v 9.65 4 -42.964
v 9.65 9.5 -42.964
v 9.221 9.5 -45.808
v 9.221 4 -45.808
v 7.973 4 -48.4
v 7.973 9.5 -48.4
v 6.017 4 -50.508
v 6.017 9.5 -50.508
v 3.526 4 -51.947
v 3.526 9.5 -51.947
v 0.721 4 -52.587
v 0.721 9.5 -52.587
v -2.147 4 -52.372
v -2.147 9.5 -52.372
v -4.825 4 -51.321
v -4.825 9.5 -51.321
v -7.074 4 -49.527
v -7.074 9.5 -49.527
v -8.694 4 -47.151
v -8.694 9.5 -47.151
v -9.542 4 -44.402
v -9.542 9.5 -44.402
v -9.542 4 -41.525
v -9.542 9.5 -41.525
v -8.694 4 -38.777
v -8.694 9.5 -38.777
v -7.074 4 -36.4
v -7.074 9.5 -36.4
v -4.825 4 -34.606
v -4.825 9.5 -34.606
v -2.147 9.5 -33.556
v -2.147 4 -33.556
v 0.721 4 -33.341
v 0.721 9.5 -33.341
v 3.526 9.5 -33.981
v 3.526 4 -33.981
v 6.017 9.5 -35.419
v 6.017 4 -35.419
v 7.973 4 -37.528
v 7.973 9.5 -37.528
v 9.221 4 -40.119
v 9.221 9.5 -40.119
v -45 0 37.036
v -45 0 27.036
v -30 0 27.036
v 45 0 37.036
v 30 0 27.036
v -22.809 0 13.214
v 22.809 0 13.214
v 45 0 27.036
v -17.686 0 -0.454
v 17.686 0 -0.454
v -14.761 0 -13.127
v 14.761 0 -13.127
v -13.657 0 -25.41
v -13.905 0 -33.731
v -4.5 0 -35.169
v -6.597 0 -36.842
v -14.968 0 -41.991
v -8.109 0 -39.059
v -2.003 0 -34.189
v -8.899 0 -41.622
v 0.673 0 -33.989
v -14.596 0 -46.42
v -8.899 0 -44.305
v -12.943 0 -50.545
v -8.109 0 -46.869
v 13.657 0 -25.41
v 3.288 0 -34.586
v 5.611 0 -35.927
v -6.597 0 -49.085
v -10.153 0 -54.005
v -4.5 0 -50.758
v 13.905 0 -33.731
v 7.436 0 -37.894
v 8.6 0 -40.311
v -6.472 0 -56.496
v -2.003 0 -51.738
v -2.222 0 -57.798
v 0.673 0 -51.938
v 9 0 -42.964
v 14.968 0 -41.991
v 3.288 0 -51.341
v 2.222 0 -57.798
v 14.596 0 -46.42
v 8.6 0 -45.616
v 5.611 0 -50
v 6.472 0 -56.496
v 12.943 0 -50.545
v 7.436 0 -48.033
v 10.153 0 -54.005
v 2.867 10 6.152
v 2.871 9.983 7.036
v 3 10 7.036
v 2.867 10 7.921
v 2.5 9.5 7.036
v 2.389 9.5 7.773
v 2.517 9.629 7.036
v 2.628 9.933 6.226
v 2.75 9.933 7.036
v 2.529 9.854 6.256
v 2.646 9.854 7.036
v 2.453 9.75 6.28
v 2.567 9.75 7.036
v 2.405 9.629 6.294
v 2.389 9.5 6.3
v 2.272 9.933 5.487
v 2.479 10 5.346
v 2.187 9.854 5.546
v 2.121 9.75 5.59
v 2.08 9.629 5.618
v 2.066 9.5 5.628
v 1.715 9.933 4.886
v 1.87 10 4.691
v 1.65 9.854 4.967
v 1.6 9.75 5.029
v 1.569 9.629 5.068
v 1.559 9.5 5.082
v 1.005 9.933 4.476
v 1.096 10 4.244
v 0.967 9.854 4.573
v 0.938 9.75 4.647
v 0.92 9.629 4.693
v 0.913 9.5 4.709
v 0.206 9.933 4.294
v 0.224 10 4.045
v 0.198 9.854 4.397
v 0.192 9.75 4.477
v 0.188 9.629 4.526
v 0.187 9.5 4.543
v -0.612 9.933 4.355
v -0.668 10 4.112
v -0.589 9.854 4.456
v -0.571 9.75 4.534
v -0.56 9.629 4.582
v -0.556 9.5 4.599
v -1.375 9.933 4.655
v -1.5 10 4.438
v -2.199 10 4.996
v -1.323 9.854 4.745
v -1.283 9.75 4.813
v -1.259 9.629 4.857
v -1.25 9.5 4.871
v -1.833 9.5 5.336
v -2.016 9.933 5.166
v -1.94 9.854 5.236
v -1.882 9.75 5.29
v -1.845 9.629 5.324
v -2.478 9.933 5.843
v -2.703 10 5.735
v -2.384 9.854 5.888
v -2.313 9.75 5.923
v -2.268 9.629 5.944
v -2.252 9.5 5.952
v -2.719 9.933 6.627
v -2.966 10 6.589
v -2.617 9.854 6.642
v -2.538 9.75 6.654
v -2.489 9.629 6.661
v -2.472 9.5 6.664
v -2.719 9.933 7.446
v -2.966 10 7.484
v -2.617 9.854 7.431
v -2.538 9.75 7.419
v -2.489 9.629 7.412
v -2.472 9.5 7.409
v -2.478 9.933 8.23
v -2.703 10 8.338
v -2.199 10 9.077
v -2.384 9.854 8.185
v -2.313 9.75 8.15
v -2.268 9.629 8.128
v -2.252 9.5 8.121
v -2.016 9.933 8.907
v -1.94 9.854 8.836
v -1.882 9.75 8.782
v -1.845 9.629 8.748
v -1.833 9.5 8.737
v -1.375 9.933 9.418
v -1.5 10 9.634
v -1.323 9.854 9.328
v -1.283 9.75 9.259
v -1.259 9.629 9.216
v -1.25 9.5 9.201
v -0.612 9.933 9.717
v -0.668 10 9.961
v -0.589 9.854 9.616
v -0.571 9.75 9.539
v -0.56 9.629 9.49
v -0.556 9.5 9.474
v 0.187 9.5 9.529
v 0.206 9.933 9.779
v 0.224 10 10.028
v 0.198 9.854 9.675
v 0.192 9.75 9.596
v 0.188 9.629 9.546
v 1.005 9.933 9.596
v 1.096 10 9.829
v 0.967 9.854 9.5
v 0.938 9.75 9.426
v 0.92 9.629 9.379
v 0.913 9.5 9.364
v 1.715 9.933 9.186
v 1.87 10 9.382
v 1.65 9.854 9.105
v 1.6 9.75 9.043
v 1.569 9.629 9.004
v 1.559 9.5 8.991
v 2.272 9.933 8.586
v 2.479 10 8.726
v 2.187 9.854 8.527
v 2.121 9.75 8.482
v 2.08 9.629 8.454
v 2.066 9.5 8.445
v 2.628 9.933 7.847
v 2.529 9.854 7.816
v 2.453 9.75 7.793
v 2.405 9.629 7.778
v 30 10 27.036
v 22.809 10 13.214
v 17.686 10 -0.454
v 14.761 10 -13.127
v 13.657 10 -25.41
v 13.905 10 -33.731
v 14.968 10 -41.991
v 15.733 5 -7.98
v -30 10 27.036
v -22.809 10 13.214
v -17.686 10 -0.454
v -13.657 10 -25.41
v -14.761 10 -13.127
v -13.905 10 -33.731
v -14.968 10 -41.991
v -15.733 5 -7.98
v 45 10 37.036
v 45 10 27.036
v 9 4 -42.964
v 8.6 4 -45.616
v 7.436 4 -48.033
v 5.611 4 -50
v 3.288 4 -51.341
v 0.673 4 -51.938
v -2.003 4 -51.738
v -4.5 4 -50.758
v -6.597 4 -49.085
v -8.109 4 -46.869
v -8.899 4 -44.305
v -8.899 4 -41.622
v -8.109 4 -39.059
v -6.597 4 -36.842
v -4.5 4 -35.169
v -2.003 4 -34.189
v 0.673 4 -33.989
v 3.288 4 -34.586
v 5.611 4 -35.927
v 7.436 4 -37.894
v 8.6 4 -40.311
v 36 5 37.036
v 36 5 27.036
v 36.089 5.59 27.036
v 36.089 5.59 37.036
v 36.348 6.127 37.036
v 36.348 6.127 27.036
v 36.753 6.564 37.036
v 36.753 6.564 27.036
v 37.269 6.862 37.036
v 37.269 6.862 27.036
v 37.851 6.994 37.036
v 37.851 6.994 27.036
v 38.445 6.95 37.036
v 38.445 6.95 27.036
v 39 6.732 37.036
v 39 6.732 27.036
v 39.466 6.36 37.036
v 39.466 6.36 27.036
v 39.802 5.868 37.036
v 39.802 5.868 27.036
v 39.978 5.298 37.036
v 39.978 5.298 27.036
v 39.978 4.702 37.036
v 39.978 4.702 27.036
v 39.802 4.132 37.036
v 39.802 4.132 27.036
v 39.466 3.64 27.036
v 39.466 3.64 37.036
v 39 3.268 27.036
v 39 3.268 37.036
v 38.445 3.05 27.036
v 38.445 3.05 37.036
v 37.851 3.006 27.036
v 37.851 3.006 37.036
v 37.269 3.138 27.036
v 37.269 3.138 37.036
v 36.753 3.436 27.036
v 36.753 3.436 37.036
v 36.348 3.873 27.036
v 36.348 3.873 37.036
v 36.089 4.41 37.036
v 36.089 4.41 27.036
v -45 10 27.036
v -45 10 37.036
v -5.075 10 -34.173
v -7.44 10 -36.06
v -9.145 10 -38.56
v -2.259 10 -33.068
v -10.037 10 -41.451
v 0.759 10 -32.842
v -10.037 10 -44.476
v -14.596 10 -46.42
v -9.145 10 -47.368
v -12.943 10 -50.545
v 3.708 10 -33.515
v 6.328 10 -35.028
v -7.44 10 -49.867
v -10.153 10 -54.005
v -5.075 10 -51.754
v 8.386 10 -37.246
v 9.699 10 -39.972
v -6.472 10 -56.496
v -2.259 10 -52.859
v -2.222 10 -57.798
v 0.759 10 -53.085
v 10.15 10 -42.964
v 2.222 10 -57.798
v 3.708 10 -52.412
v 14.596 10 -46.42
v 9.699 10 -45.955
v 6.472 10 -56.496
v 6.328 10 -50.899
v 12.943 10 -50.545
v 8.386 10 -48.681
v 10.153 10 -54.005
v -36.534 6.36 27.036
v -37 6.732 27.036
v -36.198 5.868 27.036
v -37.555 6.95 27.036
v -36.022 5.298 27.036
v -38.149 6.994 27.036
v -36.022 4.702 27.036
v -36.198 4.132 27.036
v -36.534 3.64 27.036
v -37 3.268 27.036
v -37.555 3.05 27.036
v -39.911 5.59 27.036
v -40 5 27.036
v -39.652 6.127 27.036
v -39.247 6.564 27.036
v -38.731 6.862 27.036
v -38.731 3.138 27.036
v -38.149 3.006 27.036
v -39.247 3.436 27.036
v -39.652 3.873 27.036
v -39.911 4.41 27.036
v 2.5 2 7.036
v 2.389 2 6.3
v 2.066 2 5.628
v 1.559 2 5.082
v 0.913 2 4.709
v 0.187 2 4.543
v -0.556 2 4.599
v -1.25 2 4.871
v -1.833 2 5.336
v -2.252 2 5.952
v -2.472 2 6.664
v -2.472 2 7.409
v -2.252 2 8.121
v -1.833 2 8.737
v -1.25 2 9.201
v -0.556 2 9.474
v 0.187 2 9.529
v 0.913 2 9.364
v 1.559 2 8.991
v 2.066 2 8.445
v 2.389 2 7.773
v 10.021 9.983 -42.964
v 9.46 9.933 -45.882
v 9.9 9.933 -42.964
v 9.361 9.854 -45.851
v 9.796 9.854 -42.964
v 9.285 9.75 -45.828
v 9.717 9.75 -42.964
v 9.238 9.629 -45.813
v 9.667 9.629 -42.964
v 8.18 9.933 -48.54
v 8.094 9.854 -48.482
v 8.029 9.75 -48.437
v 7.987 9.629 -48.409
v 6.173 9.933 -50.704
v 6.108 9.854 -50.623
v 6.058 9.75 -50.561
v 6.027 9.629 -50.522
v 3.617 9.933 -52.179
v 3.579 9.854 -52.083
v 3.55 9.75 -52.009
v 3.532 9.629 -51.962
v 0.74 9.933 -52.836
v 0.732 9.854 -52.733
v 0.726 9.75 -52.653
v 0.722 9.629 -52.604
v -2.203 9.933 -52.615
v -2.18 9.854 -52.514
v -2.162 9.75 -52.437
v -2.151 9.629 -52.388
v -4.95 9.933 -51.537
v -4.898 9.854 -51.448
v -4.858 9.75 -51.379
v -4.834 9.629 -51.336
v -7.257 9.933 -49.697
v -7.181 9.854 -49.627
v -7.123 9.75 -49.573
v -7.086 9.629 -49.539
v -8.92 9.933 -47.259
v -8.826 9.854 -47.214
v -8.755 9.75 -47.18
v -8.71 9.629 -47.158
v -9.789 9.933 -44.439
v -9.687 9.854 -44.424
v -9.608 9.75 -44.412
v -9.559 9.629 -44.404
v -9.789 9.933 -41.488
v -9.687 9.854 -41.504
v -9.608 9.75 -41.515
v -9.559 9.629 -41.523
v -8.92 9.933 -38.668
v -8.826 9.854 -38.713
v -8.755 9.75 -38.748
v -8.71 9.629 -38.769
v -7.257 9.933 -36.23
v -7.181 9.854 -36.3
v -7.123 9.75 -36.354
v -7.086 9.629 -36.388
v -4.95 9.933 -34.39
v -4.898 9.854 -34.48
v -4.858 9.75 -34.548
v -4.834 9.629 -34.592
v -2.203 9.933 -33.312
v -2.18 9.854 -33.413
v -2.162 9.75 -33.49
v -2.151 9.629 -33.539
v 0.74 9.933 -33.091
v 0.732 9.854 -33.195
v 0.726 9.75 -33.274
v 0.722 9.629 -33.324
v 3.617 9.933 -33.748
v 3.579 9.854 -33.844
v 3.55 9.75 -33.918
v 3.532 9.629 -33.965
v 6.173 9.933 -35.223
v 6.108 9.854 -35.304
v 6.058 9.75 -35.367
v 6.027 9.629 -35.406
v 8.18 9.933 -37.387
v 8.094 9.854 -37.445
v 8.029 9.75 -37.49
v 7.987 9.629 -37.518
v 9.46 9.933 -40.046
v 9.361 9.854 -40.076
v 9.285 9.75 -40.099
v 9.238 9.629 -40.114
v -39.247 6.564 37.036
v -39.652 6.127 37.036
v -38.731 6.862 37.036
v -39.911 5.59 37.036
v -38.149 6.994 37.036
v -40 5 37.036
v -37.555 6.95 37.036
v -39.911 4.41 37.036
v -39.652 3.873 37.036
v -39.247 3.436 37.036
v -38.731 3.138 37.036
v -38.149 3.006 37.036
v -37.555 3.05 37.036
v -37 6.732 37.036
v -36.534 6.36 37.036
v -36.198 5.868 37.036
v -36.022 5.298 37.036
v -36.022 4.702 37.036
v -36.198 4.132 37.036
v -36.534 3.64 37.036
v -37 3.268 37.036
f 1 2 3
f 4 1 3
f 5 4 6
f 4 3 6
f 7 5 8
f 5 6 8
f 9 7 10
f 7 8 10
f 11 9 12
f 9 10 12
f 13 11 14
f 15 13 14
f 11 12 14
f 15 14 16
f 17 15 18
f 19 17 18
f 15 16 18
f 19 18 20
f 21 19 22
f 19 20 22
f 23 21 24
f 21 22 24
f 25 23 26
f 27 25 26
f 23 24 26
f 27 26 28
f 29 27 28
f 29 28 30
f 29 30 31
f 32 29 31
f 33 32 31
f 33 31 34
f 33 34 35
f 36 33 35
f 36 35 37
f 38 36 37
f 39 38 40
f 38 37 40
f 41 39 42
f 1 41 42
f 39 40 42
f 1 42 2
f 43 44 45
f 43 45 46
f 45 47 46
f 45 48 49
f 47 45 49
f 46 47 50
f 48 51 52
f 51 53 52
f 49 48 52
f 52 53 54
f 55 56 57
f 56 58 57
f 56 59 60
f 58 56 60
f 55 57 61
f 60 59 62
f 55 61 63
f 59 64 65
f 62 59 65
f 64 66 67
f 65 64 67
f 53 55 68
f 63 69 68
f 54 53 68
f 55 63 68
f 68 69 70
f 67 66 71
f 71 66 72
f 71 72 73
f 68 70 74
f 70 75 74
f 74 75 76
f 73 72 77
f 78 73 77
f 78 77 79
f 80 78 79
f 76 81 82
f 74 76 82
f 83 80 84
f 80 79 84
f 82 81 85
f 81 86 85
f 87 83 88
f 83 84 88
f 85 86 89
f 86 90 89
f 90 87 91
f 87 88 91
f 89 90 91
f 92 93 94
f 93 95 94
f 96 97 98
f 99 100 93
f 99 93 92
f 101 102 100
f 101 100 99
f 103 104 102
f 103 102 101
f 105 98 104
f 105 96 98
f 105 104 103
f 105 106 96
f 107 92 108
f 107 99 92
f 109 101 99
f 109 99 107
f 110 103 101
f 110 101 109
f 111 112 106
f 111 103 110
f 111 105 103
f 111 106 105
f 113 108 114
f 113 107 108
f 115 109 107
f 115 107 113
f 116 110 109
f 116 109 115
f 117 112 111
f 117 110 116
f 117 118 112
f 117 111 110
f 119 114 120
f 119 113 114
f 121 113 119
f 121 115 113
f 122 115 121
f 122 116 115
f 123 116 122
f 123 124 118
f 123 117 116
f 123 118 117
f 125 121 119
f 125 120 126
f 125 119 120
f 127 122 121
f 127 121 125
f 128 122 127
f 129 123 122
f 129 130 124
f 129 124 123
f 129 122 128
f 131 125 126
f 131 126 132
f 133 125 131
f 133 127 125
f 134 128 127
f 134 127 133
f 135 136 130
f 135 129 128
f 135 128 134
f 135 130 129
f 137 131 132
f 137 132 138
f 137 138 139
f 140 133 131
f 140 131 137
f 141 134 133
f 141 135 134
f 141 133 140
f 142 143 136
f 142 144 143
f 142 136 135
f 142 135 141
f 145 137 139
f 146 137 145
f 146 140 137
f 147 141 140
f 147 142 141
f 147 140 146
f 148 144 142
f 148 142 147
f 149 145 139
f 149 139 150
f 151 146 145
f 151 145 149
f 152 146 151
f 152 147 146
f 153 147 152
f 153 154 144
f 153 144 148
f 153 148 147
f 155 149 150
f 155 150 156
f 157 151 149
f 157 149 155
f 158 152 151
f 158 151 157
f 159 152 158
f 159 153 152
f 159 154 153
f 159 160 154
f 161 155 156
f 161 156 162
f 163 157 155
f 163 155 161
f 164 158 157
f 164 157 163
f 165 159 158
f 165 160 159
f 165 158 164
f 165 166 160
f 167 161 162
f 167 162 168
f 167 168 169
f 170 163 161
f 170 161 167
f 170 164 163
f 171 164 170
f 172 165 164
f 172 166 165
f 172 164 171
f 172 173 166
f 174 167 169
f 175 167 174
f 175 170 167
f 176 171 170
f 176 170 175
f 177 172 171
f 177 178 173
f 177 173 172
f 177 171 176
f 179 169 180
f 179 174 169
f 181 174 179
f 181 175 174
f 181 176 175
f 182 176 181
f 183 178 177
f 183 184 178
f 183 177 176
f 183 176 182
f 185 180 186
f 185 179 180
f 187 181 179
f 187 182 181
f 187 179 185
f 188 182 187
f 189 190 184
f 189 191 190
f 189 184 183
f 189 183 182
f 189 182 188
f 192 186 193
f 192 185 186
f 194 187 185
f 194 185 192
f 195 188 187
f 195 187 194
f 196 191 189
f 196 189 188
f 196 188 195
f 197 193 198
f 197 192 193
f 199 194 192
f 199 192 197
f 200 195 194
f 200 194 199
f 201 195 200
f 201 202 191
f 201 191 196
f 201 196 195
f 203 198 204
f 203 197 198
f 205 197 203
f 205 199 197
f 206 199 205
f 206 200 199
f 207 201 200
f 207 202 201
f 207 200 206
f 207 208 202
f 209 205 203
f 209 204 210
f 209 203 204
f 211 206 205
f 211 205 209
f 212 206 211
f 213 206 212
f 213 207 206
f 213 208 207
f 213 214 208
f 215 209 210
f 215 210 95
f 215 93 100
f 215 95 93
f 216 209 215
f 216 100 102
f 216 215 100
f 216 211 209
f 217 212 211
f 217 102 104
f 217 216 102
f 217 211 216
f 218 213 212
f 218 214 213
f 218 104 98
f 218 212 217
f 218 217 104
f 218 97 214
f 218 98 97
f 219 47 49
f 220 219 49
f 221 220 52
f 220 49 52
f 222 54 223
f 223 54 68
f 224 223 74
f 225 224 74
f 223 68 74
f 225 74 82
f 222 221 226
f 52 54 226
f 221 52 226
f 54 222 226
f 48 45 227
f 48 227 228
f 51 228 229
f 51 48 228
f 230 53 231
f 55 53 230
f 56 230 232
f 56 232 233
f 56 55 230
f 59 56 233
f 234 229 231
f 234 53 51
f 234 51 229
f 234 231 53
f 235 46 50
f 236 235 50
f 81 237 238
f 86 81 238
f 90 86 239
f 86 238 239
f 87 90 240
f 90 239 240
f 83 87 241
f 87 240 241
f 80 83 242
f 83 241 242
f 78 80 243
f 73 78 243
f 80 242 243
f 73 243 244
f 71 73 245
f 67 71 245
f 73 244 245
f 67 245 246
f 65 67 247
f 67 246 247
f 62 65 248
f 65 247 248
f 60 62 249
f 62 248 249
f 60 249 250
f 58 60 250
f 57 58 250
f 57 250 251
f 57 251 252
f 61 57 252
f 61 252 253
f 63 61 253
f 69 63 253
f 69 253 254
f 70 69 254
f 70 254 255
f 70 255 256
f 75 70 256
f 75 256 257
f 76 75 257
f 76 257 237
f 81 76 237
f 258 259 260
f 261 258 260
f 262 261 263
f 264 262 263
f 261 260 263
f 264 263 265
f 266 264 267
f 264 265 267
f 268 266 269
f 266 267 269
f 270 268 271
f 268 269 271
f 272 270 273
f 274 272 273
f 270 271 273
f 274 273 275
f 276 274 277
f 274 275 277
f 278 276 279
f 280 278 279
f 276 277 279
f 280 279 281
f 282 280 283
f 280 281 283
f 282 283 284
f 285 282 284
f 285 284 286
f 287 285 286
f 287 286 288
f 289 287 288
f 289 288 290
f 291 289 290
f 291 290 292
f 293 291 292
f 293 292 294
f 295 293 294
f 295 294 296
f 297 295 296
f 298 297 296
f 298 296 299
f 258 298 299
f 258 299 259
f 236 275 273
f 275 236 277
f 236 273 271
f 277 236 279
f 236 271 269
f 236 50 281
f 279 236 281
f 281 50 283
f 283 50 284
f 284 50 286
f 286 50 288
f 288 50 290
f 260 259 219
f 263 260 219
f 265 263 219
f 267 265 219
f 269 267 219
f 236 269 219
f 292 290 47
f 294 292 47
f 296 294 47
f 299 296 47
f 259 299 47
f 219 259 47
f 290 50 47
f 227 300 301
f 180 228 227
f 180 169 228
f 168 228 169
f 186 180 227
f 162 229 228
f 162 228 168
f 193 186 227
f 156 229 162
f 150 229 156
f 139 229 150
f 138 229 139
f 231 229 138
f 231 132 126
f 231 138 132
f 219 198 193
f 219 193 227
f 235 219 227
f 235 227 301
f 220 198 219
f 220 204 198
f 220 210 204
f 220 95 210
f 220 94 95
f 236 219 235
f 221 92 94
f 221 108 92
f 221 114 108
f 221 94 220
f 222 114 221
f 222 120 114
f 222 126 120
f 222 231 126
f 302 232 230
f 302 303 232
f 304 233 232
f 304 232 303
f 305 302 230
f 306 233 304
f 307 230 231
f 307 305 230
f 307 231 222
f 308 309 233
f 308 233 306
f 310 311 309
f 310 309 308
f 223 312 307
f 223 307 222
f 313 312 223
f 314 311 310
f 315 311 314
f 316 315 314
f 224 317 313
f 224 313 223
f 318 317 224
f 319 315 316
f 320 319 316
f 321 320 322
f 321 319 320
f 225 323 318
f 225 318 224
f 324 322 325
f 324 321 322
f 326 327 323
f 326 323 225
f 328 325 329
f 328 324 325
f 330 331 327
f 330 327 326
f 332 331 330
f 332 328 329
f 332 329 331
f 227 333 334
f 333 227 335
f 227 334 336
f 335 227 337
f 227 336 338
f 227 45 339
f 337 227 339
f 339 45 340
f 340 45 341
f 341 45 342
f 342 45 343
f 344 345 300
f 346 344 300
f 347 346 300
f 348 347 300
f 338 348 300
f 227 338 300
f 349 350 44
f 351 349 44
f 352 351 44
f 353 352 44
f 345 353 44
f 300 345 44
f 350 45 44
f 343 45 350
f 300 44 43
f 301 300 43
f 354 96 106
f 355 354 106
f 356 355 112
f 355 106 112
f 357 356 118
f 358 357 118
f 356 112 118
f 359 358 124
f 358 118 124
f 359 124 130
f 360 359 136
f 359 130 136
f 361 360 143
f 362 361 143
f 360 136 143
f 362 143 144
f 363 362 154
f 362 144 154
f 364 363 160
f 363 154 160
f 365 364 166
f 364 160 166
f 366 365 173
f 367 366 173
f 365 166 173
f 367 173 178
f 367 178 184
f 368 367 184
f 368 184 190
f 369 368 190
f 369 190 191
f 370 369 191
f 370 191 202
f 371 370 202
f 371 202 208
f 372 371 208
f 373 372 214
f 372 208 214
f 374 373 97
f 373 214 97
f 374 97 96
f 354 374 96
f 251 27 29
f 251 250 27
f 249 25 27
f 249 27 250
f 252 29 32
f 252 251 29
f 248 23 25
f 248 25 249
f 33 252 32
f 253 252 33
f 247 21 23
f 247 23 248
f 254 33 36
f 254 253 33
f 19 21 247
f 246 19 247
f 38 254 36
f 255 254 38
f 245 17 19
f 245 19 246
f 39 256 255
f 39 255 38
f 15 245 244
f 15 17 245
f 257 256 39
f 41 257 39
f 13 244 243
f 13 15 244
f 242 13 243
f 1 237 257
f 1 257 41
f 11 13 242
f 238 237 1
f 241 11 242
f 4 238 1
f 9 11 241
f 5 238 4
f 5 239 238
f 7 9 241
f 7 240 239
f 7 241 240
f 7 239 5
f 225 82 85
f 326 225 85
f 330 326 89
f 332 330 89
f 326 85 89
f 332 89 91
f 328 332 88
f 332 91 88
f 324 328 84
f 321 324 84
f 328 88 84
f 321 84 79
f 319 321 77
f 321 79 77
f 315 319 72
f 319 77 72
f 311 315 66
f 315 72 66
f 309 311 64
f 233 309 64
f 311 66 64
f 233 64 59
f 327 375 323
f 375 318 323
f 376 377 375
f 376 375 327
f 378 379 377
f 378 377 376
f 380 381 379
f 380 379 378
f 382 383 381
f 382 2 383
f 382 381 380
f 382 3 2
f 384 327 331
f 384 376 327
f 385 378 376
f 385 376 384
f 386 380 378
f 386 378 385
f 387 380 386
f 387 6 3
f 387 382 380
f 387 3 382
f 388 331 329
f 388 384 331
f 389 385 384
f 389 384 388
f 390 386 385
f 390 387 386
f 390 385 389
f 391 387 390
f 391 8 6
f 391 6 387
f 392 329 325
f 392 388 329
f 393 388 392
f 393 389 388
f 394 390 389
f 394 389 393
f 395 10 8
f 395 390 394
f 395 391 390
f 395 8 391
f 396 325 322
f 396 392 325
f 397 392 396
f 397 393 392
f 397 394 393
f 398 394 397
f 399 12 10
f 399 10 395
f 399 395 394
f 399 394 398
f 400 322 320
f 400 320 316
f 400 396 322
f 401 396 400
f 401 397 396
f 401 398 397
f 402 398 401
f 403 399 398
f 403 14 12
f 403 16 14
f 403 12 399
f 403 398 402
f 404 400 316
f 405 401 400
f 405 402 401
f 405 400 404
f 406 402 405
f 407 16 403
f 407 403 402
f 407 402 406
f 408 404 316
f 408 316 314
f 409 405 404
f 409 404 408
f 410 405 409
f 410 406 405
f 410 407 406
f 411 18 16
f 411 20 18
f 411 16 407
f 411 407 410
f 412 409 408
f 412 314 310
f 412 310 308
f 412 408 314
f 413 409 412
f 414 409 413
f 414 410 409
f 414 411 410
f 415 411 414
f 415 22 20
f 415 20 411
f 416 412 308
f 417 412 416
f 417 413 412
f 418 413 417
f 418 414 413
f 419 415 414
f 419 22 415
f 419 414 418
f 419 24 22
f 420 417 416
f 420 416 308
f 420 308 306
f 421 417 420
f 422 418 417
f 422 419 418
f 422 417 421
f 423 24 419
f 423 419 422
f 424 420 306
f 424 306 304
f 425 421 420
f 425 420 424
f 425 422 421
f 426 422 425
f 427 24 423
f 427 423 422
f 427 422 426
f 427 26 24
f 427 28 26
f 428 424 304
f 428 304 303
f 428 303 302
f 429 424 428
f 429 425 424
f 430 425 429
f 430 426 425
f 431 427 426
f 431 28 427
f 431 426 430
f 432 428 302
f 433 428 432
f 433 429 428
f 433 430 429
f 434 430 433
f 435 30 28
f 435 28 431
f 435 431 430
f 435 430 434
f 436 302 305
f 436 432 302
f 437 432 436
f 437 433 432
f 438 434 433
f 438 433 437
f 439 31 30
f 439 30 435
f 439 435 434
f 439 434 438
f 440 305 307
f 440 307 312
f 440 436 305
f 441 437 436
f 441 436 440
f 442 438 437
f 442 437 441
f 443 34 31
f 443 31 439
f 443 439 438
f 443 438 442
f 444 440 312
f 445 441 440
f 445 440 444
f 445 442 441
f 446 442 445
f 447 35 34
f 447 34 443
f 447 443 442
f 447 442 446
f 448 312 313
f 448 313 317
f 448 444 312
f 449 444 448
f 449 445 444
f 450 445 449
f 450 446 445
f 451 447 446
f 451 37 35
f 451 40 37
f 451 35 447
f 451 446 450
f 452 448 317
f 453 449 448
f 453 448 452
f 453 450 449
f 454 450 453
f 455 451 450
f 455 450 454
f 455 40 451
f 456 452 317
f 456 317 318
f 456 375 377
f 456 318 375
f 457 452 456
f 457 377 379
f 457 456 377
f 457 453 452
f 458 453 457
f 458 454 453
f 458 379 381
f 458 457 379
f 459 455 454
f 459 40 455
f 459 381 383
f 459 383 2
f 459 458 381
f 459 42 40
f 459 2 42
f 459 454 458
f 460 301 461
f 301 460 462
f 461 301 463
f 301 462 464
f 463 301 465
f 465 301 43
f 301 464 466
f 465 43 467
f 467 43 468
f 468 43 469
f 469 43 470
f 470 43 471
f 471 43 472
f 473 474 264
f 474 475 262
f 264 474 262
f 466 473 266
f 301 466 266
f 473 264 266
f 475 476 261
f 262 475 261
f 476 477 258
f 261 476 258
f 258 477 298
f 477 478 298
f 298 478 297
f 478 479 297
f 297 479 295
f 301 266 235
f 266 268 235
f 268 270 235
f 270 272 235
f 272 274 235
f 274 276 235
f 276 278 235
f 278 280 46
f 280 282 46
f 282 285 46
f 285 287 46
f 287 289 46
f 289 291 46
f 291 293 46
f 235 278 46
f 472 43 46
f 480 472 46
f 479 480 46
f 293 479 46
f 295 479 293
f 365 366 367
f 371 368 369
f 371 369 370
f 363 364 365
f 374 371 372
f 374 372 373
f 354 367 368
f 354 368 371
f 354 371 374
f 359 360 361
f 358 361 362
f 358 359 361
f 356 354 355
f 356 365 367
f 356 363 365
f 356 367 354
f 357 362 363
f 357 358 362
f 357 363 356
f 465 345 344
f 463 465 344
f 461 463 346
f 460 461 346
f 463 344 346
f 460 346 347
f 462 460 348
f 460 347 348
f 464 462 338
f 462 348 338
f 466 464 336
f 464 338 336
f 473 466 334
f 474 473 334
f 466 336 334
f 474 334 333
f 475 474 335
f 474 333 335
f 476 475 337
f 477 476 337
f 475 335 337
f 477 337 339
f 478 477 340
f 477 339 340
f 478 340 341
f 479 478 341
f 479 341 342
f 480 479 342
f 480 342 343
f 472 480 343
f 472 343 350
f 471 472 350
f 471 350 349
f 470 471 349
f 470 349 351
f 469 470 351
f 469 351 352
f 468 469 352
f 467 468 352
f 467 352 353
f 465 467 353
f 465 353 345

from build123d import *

# Parameters (mm, degrees)
EXTRUDE_1_DEPTH     = 10
SKETCH_2_R          = 9.65
CUT_EXTRUDE_1_DEPTH = 6
SKETCH_3_R          = 9
CUT_EXTRUDE_2_DEPTH = 5.0000001
SKETCH_4_R          = 2
CUT_EXTRUDE_3_DEPTH = 11.0000001
SKETCH_5_R          = 2.5
CUT_EXTRUDE_4_DEPTH = 8
FILLET_1_R          = 0.5
FILLET_2_R          = 0.5


with BuildPart() as part:
    # Эскиз1 → Бобышка-Вытянуть1 (new body)
    with BuildSketch(Plane(origin=(0, 0, 0), x_dir=(1, 0, 0), z_dir=(0, 1, 0))):
        with BuildLine():
            Line((-45, -37.036390428), (45, -37.036390428))
            Line((45, -37.036390428), (45, -27.036390428))
            Line((45, -27.036390428), (30, -27.036390428))
            add(Edge.make_bspline(
                [(30, -27.036390428), (8.982189831, 8.482679734), (14.96841635, 41.990721102)],
                knots=[0, 0, 0, 0.673052388, 0.673052388, 0.673052388], degree=2))
            ThreePointArc((14.96841635, 41.990721102), (0, 57.963609572), (-14.96841635, 41.990721102))
            add(Edge.make_bspline(
                [(-30, -27.036390428), (-8.982189831, 8.482679734), (-14.96841635, 41.990721102)],
                knots=[0, 0, 0, 0.673052388, 0.673052388, 0.673052388], degree=2))
            Line((-30, -27.036390428), (-45, -27.036390428))
            Line((-45, -27.036390428), (-45, -37.036390428))
        make_face()
    extrude(amount=EXTRUDE_1_DEPTH)

    # Эскиз2 → Вырез-Вытянуть1 (cut)
    with BuildSketch(Plane(origin=(0, 10, 0), x_dir=(1, 0, 0), z_dir=(0, 1, 0))):
        with Locations((0, 42.963609572)):
            Circle(SKETCH_2_R)
    extrude(amount=-CUT_EXTRUDE_1_DEPTH, mode=Mode.SUBTRACT)

    # Эскиз3 → Вырез-Вытянуть2 (cut, through all)
    with BuildSketch(Plane(origin=(0, 4, 0), x_dir=(1, 0, 0), z_dir=(0, 1, 0))):
        with Locations((0, 42.963609572)):
            Circle(SKETCH_3_R)
    extrude(amount=-CUT_EXTRUDE_2_DEPTH, mode=Mode.SUBTRACT)

    # Эскиз4 → Вырез-Вытянуть3 (cut, through all)
    with BuildSketch(Plane(origin=(0, 0, 27.036390428), x_dir=(-1, 0, 0), z_dir=(0, 0, -1))):
        with Locations((38, 5)):
            Circle(SKETCH_4_R)
        with Locations((-38, 5)):
            Circle(SKETCH_4_R)
    extrude(amount=-CUT_EXTRUDE_3_DEPTH, mode=Mode.SUBTRACT)

    # Эскиз5 → Вырез-Вытянуть4 (cut)
    with BuildSketch(Plane(origin=(0, 10, 0), x_dir=(1, 0, 0), z_dir=(0, 1, 0))):
        with Locations((0, -7.036390428)):
            Circle(SKETCH_5_R)
    extrude(amount=-CUT_EXTRUDE_4_DEPTH, mode=Mode.SUBTRACT)

    # Скругление1
    fillet_1_edges = [part.edges().sort_by_distance(p)[0] for p in [
        (-2.5, 10, 7.036390428),
    ]]
    fillet(fillet_1_edges, radius=FILLET_1_R)

    # Скругление2
    fillet_2_edges = [part.edges().sort_by_distance(p)[0] for p in [
        (-9.65, 10, -42.963609572),
    ]]
    fillet(fillet_2_edges, radius=FILLET_2_R)


solid = part.part
